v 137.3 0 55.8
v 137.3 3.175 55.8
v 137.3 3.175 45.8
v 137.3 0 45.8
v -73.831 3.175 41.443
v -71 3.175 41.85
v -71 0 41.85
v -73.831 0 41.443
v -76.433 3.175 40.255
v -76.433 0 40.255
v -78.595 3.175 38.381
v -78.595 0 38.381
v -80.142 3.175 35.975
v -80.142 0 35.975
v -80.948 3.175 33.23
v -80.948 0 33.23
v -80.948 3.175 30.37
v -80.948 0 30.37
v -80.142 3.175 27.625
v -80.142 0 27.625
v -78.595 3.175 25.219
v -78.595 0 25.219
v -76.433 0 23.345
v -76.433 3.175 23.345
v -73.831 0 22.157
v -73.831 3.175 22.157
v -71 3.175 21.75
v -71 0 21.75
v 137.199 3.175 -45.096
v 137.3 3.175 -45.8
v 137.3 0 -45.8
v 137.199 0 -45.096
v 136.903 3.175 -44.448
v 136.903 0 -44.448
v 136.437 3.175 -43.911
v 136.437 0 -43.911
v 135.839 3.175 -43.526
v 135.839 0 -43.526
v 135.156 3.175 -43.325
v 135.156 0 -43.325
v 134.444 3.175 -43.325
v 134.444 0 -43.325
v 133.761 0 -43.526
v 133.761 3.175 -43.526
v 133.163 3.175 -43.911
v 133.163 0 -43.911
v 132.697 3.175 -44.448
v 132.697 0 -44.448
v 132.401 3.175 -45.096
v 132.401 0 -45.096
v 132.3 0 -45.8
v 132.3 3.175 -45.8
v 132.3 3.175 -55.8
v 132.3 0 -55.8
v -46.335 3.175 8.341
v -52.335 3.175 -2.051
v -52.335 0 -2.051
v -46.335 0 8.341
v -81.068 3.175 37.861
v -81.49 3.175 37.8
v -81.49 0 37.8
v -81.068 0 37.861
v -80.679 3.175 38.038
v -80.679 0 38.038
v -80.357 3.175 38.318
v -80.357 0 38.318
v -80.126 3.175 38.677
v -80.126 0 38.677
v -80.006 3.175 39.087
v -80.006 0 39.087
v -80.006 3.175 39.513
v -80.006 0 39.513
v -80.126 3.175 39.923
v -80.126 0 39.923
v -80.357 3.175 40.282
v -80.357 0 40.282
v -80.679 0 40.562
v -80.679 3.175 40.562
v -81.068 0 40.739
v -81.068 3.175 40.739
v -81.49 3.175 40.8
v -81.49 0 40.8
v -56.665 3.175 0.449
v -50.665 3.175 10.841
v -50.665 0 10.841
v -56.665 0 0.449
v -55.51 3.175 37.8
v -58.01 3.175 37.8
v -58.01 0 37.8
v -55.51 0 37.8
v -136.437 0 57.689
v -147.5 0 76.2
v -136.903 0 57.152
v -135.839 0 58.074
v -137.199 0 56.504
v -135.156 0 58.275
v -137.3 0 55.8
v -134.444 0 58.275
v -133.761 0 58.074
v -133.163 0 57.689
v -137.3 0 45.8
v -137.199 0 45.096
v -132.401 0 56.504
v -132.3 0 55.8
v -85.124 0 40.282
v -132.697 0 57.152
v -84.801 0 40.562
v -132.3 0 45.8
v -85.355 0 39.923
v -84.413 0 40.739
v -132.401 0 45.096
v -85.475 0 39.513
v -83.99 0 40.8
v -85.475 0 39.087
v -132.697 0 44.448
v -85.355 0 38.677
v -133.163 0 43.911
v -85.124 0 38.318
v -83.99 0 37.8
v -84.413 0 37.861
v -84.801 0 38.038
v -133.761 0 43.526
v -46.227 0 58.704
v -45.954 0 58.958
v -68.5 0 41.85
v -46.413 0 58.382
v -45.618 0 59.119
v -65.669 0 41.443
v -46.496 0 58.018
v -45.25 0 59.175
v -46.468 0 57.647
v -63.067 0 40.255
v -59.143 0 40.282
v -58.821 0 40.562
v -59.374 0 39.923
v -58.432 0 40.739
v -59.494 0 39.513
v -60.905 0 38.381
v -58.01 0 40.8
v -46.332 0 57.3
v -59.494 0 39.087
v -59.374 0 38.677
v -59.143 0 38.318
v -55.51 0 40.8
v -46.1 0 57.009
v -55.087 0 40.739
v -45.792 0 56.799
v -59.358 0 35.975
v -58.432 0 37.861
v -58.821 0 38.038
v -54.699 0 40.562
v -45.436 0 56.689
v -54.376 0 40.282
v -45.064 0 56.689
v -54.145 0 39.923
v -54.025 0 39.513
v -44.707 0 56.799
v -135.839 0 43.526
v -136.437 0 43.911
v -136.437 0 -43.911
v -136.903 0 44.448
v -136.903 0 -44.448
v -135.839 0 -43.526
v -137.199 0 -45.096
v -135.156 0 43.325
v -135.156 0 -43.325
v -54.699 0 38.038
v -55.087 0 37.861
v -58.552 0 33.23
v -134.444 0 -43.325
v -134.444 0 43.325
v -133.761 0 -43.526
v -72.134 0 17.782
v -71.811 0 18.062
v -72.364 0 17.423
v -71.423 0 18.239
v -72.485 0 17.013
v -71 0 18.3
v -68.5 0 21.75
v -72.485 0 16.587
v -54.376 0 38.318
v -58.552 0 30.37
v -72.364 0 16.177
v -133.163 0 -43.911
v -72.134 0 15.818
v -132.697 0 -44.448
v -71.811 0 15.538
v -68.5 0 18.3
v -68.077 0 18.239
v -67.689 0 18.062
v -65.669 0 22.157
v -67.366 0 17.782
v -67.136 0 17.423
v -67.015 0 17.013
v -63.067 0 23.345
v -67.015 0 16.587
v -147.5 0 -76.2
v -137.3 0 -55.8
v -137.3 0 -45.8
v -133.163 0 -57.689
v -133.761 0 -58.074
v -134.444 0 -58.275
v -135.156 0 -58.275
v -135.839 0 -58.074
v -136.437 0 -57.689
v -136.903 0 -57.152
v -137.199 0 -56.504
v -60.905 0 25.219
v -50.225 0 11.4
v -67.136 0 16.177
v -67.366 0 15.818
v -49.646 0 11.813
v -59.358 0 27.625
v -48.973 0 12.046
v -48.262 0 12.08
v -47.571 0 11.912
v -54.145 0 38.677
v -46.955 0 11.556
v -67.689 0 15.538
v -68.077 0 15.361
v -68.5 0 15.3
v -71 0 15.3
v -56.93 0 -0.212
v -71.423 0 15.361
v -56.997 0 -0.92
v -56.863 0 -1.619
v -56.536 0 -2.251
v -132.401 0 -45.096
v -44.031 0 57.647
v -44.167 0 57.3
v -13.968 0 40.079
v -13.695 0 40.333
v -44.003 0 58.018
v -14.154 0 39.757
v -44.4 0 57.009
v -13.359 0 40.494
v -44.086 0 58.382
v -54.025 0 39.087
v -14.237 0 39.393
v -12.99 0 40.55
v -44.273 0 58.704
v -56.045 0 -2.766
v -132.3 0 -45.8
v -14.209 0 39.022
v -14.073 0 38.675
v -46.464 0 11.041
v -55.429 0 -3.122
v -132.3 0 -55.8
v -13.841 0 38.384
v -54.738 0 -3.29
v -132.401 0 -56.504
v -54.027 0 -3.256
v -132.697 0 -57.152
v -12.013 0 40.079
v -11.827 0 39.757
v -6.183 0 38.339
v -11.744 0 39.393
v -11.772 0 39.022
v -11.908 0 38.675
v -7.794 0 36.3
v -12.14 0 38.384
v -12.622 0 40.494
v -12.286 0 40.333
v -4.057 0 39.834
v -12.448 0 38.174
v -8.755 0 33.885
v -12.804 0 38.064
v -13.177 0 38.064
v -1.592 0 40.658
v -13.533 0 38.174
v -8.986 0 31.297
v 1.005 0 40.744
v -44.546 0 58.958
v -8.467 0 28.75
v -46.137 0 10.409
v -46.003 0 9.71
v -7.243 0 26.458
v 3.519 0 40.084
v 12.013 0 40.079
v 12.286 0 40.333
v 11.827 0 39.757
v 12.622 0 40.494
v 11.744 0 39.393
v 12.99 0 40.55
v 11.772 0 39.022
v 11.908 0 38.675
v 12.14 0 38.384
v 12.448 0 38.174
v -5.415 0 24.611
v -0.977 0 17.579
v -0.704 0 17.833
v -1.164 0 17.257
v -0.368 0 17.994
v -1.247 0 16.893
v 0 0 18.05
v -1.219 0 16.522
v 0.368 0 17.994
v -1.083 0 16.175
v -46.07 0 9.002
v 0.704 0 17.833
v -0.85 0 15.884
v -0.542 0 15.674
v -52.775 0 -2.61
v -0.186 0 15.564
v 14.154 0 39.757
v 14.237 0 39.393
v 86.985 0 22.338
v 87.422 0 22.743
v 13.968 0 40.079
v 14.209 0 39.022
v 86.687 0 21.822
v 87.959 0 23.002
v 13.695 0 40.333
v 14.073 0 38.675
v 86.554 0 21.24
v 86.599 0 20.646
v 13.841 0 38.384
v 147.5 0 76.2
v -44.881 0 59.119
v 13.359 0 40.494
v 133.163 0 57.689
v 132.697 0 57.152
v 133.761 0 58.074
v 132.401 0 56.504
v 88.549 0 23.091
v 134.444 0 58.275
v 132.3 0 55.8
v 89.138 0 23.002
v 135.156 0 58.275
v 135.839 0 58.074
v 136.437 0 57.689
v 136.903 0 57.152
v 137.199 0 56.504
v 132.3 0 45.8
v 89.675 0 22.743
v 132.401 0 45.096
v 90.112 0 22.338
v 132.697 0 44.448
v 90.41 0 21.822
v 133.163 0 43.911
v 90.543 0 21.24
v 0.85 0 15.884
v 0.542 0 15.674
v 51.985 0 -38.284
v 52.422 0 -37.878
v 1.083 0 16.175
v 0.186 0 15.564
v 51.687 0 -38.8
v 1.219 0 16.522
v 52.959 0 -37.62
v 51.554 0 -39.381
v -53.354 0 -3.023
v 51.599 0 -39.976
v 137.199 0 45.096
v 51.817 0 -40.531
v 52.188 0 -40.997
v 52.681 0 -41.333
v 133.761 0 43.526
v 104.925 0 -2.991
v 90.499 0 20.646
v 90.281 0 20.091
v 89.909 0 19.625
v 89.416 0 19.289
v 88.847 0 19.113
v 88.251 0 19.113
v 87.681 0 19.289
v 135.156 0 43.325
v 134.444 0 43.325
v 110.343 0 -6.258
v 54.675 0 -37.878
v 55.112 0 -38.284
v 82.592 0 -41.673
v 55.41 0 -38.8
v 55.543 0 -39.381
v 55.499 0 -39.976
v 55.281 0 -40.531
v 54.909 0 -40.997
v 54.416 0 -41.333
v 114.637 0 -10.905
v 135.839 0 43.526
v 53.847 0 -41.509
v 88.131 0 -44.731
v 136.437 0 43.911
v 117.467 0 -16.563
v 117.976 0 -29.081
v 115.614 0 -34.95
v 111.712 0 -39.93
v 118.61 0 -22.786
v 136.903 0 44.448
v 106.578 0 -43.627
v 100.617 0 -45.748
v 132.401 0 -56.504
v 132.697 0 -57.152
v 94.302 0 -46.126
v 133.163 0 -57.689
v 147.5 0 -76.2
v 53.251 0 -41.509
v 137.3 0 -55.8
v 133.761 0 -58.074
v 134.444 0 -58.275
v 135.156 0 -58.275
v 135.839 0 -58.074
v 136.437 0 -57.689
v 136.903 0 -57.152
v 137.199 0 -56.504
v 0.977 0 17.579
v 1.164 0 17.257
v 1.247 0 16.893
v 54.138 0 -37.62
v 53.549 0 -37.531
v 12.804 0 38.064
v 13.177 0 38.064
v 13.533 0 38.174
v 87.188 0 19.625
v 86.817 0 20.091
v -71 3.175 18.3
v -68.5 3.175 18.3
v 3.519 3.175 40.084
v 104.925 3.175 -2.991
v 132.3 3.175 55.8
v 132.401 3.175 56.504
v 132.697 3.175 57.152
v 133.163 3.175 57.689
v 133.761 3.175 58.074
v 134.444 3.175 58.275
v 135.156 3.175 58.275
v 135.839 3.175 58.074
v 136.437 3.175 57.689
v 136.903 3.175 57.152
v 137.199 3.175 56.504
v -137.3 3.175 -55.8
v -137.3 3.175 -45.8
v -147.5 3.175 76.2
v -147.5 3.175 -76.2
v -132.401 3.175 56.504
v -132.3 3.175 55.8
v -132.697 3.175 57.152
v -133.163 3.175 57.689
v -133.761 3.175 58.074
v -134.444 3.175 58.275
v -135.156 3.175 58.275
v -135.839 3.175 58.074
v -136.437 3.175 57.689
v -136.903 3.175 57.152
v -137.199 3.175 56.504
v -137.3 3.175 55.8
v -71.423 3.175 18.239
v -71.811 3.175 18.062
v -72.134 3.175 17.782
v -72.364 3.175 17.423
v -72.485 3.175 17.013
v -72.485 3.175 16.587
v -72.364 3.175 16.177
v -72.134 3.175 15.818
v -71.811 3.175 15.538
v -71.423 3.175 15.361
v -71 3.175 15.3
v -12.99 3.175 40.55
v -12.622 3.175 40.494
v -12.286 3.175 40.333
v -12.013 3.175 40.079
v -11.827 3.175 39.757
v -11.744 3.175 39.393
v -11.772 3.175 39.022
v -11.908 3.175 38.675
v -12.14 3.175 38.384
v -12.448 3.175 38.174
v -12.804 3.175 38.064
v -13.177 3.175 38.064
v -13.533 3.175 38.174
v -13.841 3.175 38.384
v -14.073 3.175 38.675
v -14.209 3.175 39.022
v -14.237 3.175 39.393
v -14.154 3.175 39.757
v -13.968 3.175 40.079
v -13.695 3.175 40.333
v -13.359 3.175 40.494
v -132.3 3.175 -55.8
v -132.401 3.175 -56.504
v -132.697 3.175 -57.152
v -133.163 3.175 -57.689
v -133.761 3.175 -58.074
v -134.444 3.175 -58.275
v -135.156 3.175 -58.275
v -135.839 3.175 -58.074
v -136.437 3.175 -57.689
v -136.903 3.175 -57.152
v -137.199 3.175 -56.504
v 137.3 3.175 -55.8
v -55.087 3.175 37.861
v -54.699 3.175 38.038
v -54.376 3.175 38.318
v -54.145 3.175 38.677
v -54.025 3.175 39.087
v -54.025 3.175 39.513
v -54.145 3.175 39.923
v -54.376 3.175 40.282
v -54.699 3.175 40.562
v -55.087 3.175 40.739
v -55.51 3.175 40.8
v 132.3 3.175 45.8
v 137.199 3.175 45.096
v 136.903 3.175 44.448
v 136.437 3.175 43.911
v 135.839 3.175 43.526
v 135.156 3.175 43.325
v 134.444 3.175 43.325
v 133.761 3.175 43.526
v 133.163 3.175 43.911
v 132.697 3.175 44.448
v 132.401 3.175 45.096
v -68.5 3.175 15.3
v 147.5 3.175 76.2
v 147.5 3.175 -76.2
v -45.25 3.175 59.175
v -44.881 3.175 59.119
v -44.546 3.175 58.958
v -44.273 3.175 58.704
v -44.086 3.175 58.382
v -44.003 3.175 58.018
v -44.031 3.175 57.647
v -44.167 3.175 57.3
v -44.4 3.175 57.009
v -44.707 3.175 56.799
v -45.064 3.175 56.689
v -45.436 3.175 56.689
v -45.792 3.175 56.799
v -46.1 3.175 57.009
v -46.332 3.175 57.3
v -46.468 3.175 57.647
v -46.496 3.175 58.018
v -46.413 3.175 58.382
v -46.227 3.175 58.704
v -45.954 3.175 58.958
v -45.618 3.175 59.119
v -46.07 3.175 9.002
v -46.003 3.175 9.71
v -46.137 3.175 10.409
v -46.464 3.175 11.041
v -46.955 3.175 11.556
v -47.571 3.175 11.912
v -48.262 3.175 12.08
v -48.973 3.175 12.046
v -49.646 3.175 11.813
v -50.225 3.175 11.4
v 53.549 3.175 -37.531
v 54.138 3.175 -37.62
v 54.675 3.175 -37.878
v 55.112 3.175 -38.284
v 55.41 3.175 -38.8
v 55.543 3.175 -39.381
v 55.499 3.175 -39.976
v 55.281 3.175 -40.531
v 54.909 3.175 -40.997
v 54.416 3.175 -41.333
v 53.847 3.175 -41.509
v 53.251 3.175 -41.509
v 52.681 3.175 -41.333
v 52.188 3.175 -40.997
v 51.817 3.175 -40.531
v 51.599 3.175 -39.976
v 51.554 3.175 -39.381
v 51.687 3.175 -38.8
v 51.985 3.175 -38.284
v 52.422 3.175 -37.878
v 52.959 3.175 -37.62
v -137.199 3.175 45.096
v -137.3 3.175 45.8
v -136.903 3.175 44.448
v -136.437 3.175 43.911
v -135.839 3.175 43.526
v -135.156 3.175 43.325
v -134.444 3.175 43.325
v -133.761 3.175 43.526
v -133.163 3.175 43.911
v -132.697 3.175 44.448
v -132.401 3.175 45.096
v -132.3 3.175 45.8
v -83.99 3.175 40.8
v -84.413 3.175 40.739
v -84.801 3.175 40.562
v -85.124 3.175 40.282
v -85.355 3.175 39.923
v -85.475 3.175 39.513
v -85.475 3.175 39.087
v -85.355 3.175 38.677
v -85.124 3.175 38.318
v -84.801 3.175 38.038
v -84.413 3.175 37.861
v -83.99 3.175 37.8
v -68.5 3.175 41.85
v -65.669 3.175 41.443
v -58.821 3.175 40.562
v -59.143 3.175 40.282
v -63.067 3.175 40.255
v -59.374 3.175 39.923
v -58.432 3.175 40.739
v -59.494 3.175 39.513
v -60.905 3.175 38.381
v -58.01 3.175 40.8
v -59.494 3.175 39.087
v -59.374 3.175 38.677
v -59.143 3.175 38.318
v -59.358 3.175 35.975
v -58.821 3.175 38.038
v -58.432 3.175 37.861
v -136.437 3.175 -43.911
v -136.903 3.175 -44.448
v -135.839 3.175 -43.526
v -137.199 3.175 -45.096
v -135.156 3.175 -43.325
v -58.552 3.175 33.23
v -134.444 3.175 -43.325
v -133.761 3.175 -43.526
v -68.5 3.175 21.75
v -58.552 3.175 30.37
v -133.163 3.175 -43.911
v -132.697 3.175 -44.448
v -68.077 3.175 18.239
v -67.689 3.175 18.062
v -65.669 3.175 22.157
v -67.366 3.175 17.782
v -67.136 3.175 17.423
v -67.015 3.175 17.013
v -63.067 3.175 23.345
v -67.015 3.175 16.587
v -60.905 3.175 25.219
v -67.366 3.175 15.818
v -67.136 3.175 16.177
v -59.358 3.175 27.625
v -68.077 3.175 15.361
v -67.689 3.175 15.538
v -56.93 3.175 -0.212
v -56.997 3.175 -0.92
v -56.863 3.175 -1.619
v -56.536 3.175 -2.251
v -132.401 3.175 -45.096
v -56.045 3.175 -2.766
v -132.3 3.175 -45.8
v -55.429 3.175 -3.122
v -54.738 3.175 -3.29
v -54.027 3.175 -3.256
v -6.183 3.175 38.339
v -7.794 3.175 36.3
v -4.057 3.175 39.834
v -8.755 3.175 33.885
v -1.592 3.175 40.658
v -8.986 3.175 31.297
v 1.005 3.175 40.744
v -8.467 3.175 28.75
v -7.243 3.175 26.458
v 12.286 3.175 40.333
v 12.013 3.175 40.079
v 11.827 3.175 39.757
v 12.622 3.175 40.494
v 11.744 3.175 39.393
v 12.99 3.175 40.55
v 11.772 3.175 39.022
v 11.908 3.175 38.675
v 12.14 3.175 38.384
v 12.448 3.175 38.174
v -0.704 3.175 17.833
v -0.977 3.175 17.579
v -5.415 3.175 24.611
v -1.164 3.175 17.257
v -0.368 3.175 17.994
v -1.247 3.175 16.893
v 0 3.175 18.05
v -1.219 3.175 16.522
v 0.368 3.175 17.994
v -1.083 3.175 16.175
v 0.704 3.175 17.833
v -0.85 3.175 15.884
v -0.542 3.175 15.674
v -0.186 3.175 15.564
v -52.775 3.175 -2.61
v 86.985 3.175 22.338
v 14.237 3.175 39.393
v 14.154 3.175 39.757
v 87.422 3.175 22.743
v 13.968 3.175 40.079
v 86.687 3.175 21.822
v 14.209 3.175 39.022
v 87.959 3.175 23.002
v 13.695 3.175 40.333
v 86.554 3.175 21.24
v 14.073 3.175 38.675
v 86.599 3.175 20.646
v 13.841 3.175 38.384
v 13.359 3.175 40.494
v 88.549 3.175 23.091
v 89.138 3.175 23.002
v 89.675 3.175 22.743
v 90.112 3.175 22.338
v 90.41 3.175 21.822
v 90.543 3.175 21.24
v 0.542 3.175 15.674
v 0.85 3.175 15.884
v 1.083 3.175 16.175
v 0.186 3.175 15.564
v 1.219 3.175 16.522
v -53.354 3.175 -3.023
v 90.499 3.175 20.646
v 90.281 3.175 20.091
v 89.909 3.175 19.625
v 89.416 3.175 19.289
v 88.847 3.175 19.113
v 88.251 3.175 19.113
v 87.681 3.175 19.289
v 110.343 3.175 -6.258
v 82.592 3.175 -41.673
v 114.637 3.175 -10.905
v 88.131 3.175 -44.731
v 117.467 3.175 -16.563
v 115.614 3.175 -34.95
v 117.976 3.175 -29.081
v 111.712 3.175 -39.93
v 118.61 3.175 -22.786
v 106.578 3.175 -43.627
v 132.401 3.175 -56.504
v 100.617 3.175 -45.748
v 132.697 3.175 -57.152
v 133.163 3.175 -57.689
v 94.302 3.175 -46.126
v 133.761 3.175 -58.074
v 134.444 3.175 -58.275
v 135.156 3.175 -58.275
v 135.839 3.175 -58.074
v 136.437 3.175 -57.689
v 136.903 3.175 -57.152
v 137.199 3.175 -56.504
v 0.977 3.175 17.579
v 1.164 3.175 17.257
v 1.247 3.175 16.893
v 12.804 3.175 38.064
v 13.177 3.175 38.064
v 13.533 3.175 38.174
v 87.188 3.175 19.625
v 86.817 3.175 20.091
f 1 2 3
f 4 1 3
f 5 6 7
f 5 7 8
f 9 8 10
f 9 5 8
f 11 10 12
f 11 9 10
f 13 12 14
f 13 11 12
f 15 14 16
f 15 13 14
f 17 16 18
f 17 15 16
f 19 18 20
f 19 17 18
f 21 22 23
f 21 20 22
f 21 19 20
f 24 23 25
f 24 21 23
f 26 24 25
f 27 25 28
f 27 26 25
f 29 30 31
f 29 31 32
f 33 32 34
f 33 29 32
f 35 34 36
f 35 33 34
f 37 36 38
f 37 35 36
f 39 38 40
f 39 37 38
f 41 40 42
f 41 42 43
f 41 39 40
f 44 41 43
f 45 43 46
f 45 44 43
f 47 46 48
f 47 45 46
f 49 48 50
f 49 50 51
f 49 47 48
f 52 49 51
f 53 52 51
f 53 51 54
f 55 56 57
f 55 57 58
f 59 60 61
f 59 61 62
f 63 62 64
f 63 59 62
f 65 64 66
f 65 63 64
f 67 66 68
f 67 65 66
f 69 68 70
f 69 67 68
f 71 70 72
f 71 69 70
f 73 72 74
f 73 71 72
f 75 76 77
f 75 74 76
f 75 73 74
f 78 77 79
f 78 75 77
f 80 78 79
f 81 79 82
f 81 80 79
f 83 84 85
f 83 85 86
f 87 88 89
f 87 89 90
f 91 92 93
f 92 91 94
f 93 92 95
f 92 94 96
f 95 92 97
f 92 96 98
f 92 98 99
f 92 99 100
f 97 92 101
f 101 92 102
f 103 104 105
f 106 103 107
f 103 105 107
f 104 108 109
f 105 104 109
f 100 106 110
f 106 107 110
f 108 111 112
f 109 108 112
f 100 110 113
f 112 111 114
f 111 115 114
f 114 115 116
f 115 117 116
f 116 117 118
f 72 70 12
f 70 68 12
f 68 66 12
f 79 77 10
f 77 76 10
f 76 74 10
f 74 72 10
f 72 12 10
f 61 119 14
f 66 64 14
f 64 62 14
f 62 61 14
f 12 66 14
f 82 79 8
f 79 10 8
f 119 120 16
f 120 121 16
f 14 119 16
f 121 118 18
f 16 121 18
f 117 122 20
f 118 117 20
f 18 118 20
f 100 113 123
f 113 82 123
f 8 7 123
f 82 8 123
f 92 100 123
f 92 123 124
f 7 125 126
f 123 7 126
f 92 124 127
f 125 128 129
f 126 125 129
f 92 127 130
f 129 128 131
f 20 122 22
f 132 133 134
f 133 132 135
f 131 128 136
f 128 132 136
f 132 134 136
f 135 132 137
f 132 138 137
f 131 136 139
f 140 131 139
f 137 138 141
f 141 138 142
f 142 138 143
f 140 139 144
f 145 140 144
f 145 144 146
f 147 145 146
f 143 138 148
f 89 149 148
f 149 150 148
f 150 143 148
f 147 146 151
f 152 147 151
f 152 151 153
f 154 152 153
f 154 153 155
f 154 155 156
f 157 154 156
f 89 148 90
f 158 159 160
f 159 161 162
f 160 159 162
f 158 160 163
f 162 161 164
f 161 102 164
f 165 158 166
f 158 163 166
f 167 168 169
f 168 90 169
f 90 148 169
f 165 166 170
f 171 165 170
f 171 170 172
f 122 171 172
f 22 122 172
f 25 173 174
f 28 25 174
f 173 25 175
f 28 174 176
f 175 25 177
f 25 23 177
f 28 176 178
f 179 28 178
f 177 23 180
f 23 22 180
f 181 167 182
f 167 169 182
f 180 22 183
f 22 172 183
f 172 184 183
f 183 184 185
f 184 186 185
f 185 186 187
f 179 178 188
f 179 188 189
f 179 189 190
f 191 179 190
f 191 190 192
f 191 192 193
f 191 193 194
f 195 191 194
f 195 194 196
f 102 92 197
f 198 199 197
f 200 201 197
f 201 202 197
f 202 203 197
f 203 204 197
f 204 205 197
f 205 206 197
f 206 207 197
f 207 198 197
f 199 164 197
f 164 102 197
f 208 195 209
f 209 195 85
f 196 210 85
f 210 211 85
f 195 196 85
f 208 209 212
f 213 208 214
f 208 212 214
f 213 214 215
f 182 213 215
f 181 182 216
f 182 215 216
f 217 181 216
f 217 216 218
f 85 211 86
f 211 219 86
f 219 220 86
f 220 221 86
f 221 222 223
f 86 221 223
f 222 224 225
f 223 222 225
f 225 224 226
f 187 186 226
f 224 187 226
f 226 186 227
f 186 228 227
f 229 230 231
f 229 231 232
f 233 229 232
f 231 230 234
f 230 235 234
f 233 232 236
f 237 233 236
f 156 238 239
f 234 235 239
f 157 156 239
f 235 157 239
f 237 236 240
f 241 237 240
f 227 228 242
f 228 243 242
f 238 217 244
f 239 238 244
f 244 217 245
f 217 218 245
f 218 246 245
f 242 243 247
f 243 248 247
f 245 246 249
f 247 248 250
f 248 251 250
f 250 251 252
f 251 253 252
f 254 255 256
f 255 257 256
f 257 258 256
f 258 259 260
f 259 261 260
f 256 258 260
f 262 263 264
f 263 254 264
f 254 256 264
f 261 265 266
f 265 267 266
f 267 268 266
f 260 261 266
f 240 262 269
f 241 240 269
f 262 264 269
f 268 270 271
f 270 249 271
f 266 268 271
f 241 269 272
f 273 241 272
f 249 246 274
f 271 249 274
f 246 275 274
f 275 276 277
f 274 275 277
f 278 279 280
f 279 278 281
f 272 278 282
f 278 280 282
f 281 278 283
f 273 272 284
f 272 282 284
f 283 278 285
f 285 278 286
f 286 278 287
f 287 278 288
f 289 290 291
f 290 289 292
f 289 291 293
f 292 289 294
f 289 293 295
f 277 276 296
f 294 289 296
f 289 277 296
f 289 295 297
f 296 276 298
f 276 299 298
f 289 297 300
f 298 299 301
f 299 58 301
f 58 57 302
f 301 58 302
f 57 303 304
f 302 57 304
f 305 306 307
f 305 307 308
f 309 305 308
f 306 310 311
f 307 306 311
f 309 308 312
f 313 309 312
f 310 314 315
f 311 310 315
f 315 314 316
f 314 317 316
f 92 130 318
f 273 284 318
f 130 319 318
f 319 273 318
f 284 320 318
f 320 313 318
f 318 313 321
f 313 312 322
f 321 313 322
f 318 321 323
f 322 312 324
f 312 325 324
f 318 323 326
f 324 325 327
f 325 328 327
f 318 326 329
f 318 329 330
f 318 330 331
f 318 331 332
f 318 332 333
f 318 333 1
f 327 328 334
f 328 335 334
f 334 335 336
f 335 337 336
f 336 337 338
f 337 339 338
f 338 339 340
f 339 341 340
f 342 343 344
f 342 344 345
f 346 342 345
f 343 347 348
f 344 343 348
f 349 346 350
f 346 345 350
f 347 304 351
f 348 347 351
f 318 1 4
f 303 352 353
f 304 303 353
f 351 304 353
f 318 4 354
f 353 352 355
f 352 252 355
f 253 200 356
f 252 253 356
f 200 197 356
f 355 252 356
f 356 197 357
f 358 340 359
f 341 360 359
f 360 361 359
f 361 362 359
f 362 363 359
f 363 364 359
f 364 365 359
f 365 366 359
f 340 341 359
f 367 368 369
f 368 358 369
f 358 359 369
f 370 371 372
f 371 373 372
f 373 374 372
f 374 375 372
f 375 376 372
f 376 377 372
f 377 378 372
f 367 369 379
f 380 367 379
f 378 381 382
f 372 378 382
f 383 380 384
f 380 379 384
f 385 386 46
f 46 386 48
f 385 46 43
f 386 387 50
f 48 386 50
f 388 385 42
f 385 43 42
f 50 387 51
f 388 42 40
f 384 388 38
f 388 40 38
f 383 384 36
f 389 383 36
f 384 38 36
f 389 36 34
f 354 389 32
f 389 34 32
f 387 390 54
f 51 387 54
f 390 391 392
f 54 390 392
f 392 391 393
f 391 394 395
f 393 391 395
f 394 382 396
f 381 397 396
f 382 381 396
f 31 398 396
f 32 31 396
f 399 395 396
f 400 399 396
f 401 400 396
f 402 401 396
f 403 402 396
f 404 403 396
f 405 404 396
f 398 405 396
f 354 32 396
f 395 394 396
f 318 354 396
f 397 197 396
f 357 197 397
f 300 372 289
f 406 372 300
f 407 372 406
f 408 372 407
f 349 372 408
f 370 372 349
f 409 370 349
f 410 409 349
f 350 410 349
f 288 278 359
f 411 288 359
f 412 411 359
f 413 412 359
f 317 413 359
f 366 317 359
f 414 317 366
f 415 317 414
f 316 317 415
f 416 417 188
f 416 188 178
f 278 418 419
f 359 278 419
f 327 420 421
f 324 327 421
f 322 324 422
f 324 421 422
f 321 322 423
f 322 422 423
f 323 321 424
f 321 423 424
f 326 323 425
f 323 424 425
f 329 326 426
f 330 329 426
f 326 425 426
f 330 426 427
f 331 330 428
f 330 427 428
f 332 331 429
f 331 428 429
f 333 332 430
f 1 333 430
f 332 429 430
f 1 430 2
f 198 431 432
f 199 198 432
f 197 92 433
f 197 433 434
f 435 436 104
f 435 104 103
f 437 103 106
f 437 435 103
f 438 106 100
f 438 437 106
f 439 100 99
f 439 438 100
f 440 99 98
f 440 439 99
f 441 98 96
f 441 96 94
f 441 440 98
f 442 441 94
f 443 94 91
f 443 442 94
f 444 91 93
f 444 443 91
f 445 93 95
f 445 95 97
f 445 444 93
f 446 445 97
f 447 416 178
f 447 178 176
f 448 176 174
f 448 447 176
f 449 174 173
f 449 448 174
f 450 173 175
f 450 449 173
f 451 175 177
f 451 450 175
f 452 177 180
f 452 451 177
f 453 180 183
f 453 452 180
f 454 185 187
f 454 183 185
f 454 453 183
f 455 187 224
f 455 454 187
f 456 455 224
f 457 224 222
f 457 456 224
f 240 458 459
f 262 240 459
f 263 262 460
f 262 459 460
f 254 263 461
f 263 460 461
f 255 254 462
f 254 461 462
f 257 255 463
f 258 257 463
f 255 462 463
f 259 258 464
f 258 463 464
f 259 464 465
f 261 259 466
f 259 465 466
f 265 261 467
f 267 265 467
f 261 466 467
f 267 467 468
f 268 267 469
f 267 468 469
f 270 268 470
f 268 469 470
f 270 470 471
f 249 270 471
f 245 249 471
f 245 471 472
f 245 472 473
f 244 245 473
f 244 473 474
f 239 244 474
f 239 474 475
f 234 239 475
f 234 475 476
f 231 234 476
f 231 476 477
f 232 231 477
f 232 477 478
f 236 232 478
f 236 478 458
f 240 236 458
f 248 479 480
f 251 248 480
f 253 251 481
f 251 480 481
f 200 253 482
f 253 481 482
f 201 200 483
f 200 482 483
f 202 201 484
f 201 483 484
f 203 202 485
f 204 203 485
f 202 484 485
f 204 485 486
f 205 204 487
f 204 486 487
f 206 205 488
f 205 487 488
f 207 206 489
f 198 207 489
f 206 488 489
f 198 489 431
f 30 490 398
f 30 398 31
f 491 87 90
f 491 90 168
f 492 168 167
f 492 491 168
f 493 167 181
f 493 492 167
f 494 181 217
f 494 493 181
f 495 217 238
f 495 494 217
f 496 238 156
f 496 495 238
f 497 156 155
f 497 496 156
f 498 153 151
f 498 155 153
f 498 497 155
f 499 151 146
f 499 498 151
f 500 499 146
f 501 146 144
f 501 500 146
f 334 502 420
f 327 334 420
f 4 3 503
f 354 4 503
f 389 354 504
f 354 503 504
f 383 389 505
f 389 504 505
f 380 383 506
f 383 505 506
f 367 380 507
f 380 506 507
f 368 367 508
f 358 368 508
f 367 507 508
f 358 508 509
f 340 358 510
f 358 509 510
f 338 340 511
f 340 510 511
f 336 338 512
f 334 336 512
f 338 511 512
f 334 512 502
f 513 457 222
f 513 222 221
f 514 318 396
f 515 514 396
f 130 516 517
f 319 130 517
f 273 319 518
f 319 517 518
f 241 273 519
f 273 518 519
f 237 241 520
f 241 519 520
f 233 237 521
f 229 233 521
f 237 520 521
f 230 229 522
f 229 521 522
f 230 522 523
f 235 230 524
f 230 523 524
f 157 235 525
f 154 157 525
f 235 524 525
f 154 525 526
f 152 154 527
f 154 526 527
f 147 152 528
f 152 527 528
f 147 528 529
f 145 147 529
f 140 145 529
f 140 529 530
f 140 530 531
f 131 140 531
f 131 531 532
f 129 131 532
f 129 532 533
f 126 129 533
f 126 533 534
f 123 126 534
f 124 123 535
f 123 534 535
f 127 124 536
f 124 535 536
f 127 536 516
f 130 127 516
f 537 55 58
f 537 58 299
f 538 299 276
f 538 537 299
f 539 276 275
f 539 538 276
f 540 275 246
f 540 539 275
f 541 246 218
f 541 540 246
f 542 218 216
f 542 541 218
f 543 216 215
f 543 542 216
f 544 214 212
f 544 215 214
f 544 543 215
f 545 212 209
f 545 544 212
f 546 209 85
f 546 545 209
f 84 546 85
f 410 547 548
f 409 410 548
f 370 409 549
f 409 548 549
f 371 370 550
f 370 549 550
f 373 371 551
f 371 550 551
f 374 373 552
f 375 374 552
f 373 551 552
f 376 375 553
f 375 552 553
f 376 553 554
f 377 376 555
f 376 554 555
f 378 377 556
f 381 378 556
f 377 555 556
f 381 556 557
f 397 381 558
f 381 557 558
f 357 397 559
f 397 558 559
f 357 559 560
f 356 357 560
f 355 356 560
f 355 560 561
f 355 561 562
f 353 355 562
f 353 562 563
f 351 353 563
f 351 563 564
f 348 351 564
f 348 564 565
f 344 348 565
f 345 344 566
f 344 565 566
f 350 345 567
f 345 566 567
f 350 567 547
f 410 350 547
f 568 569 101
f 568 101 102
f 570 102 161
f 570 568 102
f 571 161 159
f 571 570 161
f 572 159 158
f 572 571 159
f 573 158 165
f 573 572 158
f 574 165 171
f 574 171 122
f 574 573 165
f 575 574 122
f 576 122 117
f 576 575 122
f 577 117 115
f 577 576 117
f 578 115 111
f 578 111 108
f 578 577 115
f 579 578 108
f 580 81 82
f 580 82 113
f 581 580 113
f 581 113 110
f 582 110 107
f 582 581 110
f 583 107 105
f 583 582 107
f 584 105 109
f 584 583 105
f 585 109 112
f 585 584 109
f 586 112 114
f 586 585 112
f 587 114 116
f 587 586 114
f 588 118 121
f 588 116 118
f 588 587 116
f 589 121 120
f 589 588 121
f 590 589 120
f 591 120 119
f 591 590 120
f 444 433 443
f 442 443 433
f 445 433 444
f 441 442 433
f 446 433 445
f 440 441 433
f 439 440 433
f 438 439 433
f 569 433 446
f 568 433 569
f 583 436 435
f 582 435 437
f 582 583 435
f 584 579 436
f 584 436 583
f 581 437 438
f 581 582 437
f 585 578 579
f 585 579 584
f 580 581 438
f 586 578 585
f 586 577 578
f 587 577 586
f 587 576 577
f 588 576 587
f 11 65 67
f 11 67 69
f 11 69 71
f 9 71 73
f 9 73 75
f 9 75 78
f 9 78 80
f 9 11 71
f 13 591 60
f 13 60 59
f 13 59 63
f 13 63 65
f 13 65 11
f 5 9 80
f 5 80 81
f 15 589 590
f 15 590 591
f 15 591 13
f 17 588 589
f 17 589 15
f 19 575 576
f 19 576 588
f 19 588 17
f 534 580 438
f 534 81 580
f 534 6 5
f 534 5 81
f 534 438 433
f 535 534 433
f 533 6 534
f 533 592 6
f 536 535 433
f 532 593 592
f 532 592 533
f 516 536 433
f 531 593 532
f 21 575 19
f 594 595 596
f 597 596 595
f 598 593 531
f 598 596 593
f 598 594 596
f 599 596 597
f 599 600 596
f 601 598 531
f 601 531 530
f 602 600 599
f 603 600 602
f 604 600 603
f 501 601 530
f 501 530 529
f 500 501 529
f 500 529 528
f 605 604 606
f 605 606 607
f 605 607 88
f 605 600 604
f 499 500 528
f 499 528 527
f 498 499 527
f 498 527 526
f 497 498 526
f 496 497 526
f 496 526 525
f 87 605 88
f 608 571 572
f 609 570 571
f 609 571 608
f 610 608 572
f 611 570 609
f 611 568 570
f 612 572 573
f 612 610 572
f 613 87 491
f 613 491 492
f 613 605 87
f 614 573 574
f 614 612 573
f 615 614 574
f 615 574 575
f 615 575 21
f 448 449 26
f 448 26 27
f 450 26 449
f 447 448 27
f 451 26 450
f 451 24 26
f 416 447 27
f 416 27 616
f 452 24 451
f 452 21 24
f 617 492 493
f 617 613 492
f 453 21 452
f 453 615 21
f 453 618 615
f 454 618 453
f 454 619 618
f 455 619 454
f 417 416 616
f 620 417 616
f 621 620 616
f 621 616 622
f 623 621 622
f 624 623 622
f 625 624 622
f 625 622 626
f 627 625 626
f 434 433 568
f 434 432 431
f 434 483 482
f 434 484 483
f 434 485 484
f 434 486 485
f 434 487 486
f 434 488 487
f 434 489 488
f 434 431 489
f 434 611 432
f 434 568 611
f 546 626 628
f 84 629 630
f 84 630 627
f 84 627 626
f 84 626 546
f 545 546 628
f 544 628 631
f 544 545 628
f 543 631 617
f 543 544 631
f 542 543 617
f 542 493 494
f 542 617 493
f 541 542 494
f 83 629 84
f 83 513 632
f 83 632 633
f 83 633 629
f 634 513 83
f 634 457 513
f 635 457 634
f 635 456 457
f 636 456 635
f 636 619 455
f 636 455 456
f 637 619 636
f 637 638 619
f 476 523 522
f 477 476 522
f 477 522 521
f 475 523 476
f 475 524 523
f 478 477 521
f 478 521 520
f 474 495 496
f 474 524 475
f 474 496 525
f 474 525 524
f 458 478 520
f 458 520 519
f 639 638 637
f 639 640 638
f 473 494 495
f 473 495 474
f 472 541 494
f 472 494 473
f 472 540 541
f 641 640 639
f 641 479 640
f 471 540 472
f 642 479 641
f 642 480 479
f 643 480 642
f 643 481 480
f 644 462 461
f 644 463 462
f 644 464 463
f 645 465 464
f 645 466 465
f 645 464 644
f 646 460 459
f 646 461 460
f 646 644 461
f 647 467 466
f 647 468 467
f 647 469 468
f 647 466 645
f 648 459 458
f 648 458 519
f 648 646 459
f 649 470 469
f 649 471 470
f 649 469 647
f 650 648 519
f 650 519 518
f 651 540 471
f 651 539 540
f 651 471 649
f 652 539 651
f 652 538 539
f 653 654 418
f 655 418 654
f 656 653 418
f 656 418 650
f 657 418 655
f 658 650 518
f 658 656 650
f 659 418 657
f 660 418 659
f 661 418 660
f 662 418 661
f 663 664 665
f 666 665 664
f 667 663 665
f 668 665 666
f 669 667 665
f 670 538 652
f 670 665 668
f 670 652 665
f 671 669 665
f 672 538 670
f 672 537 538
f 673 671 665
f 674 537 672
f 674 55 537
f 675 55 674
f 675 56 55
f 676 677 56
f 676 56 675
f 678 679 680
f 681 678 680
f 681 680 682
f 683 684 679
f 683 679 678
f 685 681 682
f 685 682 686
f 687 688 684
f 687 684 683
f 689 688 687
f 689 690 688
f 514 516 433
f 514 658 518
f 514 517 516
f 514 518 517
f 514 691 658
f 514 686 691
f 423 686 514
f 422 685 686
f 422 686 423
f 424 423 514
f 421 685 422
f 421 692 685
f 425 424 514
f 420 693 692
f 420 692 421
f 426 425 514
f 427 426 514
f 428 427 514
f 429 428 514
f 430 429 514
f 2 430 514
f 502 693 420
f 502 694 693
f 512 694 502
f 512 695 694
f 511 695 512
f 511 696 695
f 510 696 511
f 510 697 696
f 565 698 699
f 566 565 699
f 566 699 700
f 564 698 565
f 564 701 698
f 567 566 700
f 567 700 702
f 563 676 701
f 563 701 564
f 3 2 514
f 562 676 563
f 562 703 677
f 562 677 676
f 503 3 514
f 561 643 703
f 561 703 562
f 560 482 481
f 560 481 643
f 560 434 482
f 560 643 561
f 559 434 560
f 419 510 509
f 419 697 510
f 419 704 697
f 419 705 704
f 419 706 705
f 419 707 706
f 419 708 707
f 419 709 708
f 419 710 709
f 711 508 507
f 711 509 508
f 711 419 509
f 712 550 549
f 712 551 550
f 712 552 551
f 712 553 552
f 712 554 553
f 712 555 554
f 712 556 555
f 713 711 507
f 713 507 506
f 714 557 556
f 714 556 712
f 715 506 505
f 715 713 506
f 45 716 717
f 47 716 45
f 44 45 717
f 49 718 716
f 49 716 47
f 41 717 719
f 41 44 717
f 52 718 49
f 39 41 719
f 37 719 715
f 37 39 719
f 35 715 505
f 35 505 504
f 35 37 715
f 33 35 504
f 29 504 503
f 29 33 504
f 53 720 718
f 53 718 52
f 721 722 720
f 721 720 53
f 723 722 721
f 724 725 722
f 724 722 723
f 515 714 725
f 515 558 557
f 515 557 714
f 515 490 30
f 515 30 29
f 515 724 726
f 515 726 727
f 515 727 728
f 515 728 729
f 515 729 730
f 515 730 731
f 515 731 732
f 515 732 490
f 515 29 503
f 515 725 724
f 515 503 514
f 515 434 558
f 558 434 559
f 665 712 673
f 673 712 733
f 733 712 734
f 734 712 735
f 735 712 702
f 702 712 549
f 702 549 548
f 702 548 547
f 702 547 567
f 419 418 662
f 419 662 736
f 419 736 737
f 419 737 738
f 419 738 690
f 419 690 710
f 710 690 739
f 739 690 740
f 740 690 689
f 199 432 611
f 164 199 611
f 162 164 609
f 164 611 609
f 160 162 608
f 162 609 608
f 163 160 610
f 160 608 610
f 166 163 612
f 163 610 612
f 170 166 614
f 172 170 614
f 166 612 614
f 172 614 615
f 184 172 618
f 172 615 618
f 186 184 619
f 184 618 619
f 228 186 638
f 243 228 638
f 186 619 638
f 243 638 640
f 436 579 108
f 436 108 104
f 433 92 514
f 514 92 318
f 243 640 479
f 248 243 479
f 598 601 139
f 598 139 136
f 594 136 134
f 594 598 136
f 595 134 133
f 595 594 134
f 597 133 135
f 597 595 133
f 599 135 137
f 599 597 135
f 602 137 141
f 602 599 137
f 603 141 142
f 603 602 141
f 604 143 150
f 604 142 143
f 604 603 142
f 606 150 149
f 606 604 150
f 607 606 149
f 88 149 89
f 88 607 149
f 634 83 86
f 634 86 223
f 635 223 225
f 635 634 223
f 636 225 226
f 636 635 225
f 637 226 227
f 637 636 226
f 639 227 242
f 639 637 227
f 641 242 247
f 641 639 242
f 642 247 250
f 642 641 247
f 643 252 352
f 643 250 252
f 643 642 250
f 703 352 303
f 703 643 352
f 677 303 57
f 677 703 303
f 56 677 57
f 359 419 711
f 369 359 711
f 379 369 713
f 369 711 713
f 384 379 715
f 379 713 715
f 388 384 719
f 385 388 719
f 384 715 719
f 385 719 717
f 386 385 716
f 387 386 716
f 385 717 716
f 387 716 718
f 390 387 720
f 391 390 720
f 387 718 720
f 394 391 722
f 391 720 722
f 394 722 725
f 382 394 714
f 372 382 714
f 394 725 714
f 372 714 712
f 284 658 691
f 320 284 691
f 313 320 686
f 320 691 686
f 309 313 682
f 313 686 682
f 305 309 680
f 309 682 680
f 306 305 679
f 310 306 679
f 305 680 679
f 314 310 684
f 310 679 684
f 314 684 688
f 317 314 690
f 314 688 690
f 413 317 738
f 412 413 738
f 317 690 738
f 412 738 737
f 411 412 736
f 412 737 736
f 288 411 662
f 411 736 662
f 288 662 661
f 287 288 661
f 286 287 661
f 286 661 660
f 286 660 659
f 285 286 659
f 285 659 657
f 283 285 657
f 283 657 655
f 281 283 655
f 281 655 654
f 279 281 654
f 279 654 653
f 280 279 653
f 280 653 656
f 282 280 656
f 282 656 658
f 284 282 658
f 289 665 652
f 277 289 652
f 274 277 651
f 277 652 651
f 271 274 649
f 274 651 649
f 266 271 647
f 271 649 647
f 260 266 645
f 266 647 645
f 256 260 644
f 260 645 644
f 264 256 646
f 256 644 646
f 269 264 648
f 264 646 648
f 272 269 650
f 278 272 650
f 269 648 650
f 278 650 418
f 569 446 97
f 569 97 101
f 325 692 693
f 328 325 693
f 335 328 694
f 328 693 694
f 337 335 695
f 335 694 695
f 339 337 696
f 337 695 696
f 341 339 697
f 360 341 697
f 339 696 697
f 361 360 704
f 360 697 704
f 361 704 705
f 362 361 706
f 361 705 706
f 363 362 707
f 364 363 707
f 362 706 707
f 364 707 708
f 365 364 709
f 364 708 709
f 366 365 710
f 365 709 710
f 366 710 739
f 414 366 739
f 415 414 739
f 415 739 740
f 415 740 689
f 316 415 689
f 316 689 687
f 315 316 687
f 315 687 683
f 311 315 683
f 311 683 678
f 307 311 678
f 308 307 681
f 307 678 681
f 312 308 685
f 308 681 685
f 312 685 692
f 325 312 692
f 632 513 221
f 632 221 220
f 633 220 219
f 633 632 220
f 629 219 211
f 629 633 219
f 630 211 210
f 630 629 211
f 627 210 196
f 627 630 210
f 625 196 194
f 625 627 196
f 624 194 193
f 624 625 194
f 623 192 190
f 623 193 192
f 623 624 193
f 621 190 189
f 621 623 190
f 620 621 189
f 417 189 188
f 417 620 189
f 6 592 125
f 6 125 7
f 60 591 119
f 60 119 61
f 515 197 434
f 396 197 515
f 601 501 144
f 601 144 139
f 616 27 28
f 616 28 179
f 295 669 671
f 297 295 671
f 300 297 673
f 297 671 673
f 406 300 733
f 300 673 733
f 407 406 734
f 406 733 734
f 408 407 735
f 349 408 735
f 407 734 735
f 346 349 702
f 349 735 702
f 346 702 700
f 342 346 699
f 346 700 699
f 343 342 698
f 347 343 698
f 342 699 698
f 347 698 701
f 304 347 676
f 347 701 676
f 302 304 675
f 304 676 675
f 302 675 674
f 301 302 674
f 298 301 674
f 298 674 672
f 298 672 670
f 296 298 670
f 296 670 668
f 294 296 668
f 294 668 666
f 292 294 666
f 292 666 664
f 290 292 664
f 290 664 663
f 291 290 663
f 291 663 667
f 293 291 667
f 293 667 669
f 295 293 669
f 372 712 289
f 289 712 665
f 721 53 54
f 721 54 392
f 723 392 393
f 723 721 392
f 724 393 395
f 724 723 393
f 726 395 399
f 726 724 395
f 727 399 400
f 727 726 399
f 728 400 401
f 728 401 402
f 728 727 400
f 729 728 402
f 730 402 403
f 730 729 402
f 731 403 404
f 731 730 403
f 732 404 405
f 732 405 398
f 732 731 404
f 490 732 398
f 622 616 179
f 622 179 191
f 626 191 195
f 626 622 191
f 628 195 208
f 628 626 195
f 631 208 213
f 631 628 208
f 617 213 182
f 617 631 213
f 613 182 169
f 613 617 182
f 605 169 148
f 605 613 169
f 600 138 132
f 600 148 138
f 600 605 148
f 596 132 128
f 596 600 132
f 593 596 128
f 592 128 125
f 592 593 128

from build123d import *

# Parameters (mm, degrees)
CROQUIS1_W              = 295
CROQUIS1_H              = 152.4
SALIENTE_EXTRUIR1_DEPTH = 3.175
CROQUIS2_R              = 9
CROQUIS2_R_2            = 22.5
CROQUIS2_R_3            = 2
CROQUIS2_R_4            = 1.25
CORTAR_EXTRUIR1_DEPTH   = 3.175
CROQUIS3_R              = 1.25
CORTAR_EXTRUIR2_DEPTH   = 167.050506247


with BuildPart() as part:
    # Croquis1 → Saliente-Extruir1 (new body)
    with BuildSketch(Plane(origin=(0, 0, 0), x_dir=(1, 0, 0), z_dir=(0, 1, 0))):
        Rectangle(CROQUIS1_W, CROQUIS1_H)
    extrude(amount=SALIENTE_EXTRUIR1_DEPTH)

    # Croquis2 → Cortar-Extruir1 (cut)
    with BuildSketch(Plane(origin=(0, 3.175, 0), x_dir=(1, 0, 0), z_dir=(0, 1, 0))):
        with BuildLine():
            Line((-137.3, 55.8), (-137.3, 45.8))
            ThreePointArc((-137.3, 45.8), (-134.8, 43.3), (-132.3, 45.8))
            Line((-132.3, 45.8), (-132.3, 55.8))
            ThreePointArc((-132.3, 55.8), (-134.8, 58.3), (-137.3, 55.8))
        make_face()
        with BuildLine():
            ThreePointArc((-137.3, -45.8), (-134.8, -43.3), (-132.3, -45.8))
            Line((-132.3, -45.8), (-132.3, -55.8))
            ThreePointArc((-132.3, -55.8), (-134.8, -58.3), (-137.3, -55.8))
            Line((-137.3, -55.8), (-137.3, -45.8))
        make_face()
        with Locations((0, -31.8)):
            Circle(CROQUIS2_R)
        with Locations((96.12881982, 23.7)):
            Circle(CROQUIS2_R_2)
        with Locations(Location((53.548724126, 39.530889132, 0), (0, 0, 270))):
            Circle(CROQUIS2_R_3)
        with Locations(Location((88.548724126, -21.090889132, 0), (0, 0, 270))):
            Circle(CROQUIS2_R_3)
        with BuildLine():
            ThreePointArc((137.3, 45.8), (134.8, 43.3), (132.3, 45.8))
            Line((132.3, 45.8), (132.3, 55.8))
            ThreePointArc((132.3, 55.8), (134.8, 58.3), (137.3, 55.8))
            Line((137.3, 55.8), (137.3, 45.8))
        make_face()
        with BuildLine():
            Line((137.3, -55.8), (137.3, -45.8))
            ThreePointArc((137.3, -45.8), (134.8, -43.3), (132.3, -45.8))
            Line((132.3, -45.8), (132.3, -55.8))
            ThreePointArc((132.3, -55.8), (134.8, -58.3), (137.3, -55.8))
        make_face()
        with BuildLine():
            Line((82.592466968, 41.672677916), (-5.414541141, -24.610928834))
            ThreePointArc((-5.414541141, -24.610928834), (4.01678539, -23.746091934), (9, -31.8))
            ThreePointArc((9, -31.8), (7.505592222, -36.76649629), (3.518647689, -40.083665761))
            Line((3.518647689, -40.083665761), (104.925439043, 2.990835598))
            ThreePointArc((104.925439043, 2.990835598), (76.643248235, 12.45), (82.592466968, 41.672677916))
        make_face()
        with Locations(Location((-45.249827348, -57.925, 0), (0, 0, 270))):
            Circle(CROQUIS2_R_4)
    extrude(amount=-CORTAR_EXTRUIR1_DEPTH, mode=Mode.SUBTRACT)

    # Croquis3 → Cortar-Extruir2 (cut, through all)
    with BuildSketch(Plane(origin=(0, 3.175, 0), x_dir=(1, 0, 0), z_dir=(0, 1, 0))):
        with Locations(Location((0, -16.8, 0), (0, 0, 270))):
            Circle(CROQUIS3_R)
        with Locations(Location((12.990381057, -39.3, 0), (0, 0, 270))):
            Circle(CROQUIS3_R)
        with Locations(Location((-12.990381057, -39.3, 0), (0, 0, 270))):
            Circle(CROQUIS3_R)
        with BuildLine():
            Line((-52.334936491, 2.051152423), (-46.334936491, -8.341152423))
            ThreePointArc((-46.334936491, -8.341152423), (-47.25, -11.756215932), (-50.665063509, -10.841152423))
            Line((-50.665063509, -10.841152423), (-56.665063509, -0.448847577))
            ThreePointArc((-56.665063509, -0.448847577), (-55.75, 2.966215932), (-52.334936491, 2.051152423))
        make_face()
        with BuildLine():
            Line((-71, -15.3), (-68.5, -15.3))
            ThreePointArc((-68.5, -15.3), (-67, -16.8), (-68.5, -18.3))
            Line((-68.5, -18.3), (-71, -18.3))
            ThreePointArc((-71, -18.3), (-72.5, -16.8), (-71, -15.3))
        make_face()
        with BuildLine():
            Line((-58.009618943, -37.8), (-55.509618943, -37.8))
            ThreePointArc((-55.509618943, -37.8), (-54.009618943, -39.3), (-55.509618943, -40.8))
            Line((-55.509618943, -40.8), (-58.009618943, -40.8))
            ThreePointArc((-58.009618943, -40.8), (-59.509618943, -39.3), (-58.009618943, -37.8))
        make_face()
        with BuildLine():
            Line((-83.990381057, -37.8), (-81.490381057, -37.8))
            ThreePointArc((-81.490381057, -37.8), (-79.990381057, -39.3), (-81.490381057, -40.8))
            Line((-81.490381057, -40.8), (-83.990381057, -40.8))
            ThreePointArc((-83.990381057, -40.8), (-85.490381057, -39.3), (-83.990381057, -37.8))
        make_face()
        with BuildLine():
            Line((-71, -21.75), (-68.5, -21.75))
            ThreePointArc((-68.5, -21.75), (-58.45, -31.8), (-68.5, -41.85))
            Line((-68.5, -41.85), (-71, -41.85))
            ThreePointArc((-71, -41.85), (-81.05, -31.8), (-71, -21.75))
        make_face()
    extrude(amount=-CORTAR_EXTRUIR2_DEPTH, mode=Mode.SUBTRACT)


solid = part.part
